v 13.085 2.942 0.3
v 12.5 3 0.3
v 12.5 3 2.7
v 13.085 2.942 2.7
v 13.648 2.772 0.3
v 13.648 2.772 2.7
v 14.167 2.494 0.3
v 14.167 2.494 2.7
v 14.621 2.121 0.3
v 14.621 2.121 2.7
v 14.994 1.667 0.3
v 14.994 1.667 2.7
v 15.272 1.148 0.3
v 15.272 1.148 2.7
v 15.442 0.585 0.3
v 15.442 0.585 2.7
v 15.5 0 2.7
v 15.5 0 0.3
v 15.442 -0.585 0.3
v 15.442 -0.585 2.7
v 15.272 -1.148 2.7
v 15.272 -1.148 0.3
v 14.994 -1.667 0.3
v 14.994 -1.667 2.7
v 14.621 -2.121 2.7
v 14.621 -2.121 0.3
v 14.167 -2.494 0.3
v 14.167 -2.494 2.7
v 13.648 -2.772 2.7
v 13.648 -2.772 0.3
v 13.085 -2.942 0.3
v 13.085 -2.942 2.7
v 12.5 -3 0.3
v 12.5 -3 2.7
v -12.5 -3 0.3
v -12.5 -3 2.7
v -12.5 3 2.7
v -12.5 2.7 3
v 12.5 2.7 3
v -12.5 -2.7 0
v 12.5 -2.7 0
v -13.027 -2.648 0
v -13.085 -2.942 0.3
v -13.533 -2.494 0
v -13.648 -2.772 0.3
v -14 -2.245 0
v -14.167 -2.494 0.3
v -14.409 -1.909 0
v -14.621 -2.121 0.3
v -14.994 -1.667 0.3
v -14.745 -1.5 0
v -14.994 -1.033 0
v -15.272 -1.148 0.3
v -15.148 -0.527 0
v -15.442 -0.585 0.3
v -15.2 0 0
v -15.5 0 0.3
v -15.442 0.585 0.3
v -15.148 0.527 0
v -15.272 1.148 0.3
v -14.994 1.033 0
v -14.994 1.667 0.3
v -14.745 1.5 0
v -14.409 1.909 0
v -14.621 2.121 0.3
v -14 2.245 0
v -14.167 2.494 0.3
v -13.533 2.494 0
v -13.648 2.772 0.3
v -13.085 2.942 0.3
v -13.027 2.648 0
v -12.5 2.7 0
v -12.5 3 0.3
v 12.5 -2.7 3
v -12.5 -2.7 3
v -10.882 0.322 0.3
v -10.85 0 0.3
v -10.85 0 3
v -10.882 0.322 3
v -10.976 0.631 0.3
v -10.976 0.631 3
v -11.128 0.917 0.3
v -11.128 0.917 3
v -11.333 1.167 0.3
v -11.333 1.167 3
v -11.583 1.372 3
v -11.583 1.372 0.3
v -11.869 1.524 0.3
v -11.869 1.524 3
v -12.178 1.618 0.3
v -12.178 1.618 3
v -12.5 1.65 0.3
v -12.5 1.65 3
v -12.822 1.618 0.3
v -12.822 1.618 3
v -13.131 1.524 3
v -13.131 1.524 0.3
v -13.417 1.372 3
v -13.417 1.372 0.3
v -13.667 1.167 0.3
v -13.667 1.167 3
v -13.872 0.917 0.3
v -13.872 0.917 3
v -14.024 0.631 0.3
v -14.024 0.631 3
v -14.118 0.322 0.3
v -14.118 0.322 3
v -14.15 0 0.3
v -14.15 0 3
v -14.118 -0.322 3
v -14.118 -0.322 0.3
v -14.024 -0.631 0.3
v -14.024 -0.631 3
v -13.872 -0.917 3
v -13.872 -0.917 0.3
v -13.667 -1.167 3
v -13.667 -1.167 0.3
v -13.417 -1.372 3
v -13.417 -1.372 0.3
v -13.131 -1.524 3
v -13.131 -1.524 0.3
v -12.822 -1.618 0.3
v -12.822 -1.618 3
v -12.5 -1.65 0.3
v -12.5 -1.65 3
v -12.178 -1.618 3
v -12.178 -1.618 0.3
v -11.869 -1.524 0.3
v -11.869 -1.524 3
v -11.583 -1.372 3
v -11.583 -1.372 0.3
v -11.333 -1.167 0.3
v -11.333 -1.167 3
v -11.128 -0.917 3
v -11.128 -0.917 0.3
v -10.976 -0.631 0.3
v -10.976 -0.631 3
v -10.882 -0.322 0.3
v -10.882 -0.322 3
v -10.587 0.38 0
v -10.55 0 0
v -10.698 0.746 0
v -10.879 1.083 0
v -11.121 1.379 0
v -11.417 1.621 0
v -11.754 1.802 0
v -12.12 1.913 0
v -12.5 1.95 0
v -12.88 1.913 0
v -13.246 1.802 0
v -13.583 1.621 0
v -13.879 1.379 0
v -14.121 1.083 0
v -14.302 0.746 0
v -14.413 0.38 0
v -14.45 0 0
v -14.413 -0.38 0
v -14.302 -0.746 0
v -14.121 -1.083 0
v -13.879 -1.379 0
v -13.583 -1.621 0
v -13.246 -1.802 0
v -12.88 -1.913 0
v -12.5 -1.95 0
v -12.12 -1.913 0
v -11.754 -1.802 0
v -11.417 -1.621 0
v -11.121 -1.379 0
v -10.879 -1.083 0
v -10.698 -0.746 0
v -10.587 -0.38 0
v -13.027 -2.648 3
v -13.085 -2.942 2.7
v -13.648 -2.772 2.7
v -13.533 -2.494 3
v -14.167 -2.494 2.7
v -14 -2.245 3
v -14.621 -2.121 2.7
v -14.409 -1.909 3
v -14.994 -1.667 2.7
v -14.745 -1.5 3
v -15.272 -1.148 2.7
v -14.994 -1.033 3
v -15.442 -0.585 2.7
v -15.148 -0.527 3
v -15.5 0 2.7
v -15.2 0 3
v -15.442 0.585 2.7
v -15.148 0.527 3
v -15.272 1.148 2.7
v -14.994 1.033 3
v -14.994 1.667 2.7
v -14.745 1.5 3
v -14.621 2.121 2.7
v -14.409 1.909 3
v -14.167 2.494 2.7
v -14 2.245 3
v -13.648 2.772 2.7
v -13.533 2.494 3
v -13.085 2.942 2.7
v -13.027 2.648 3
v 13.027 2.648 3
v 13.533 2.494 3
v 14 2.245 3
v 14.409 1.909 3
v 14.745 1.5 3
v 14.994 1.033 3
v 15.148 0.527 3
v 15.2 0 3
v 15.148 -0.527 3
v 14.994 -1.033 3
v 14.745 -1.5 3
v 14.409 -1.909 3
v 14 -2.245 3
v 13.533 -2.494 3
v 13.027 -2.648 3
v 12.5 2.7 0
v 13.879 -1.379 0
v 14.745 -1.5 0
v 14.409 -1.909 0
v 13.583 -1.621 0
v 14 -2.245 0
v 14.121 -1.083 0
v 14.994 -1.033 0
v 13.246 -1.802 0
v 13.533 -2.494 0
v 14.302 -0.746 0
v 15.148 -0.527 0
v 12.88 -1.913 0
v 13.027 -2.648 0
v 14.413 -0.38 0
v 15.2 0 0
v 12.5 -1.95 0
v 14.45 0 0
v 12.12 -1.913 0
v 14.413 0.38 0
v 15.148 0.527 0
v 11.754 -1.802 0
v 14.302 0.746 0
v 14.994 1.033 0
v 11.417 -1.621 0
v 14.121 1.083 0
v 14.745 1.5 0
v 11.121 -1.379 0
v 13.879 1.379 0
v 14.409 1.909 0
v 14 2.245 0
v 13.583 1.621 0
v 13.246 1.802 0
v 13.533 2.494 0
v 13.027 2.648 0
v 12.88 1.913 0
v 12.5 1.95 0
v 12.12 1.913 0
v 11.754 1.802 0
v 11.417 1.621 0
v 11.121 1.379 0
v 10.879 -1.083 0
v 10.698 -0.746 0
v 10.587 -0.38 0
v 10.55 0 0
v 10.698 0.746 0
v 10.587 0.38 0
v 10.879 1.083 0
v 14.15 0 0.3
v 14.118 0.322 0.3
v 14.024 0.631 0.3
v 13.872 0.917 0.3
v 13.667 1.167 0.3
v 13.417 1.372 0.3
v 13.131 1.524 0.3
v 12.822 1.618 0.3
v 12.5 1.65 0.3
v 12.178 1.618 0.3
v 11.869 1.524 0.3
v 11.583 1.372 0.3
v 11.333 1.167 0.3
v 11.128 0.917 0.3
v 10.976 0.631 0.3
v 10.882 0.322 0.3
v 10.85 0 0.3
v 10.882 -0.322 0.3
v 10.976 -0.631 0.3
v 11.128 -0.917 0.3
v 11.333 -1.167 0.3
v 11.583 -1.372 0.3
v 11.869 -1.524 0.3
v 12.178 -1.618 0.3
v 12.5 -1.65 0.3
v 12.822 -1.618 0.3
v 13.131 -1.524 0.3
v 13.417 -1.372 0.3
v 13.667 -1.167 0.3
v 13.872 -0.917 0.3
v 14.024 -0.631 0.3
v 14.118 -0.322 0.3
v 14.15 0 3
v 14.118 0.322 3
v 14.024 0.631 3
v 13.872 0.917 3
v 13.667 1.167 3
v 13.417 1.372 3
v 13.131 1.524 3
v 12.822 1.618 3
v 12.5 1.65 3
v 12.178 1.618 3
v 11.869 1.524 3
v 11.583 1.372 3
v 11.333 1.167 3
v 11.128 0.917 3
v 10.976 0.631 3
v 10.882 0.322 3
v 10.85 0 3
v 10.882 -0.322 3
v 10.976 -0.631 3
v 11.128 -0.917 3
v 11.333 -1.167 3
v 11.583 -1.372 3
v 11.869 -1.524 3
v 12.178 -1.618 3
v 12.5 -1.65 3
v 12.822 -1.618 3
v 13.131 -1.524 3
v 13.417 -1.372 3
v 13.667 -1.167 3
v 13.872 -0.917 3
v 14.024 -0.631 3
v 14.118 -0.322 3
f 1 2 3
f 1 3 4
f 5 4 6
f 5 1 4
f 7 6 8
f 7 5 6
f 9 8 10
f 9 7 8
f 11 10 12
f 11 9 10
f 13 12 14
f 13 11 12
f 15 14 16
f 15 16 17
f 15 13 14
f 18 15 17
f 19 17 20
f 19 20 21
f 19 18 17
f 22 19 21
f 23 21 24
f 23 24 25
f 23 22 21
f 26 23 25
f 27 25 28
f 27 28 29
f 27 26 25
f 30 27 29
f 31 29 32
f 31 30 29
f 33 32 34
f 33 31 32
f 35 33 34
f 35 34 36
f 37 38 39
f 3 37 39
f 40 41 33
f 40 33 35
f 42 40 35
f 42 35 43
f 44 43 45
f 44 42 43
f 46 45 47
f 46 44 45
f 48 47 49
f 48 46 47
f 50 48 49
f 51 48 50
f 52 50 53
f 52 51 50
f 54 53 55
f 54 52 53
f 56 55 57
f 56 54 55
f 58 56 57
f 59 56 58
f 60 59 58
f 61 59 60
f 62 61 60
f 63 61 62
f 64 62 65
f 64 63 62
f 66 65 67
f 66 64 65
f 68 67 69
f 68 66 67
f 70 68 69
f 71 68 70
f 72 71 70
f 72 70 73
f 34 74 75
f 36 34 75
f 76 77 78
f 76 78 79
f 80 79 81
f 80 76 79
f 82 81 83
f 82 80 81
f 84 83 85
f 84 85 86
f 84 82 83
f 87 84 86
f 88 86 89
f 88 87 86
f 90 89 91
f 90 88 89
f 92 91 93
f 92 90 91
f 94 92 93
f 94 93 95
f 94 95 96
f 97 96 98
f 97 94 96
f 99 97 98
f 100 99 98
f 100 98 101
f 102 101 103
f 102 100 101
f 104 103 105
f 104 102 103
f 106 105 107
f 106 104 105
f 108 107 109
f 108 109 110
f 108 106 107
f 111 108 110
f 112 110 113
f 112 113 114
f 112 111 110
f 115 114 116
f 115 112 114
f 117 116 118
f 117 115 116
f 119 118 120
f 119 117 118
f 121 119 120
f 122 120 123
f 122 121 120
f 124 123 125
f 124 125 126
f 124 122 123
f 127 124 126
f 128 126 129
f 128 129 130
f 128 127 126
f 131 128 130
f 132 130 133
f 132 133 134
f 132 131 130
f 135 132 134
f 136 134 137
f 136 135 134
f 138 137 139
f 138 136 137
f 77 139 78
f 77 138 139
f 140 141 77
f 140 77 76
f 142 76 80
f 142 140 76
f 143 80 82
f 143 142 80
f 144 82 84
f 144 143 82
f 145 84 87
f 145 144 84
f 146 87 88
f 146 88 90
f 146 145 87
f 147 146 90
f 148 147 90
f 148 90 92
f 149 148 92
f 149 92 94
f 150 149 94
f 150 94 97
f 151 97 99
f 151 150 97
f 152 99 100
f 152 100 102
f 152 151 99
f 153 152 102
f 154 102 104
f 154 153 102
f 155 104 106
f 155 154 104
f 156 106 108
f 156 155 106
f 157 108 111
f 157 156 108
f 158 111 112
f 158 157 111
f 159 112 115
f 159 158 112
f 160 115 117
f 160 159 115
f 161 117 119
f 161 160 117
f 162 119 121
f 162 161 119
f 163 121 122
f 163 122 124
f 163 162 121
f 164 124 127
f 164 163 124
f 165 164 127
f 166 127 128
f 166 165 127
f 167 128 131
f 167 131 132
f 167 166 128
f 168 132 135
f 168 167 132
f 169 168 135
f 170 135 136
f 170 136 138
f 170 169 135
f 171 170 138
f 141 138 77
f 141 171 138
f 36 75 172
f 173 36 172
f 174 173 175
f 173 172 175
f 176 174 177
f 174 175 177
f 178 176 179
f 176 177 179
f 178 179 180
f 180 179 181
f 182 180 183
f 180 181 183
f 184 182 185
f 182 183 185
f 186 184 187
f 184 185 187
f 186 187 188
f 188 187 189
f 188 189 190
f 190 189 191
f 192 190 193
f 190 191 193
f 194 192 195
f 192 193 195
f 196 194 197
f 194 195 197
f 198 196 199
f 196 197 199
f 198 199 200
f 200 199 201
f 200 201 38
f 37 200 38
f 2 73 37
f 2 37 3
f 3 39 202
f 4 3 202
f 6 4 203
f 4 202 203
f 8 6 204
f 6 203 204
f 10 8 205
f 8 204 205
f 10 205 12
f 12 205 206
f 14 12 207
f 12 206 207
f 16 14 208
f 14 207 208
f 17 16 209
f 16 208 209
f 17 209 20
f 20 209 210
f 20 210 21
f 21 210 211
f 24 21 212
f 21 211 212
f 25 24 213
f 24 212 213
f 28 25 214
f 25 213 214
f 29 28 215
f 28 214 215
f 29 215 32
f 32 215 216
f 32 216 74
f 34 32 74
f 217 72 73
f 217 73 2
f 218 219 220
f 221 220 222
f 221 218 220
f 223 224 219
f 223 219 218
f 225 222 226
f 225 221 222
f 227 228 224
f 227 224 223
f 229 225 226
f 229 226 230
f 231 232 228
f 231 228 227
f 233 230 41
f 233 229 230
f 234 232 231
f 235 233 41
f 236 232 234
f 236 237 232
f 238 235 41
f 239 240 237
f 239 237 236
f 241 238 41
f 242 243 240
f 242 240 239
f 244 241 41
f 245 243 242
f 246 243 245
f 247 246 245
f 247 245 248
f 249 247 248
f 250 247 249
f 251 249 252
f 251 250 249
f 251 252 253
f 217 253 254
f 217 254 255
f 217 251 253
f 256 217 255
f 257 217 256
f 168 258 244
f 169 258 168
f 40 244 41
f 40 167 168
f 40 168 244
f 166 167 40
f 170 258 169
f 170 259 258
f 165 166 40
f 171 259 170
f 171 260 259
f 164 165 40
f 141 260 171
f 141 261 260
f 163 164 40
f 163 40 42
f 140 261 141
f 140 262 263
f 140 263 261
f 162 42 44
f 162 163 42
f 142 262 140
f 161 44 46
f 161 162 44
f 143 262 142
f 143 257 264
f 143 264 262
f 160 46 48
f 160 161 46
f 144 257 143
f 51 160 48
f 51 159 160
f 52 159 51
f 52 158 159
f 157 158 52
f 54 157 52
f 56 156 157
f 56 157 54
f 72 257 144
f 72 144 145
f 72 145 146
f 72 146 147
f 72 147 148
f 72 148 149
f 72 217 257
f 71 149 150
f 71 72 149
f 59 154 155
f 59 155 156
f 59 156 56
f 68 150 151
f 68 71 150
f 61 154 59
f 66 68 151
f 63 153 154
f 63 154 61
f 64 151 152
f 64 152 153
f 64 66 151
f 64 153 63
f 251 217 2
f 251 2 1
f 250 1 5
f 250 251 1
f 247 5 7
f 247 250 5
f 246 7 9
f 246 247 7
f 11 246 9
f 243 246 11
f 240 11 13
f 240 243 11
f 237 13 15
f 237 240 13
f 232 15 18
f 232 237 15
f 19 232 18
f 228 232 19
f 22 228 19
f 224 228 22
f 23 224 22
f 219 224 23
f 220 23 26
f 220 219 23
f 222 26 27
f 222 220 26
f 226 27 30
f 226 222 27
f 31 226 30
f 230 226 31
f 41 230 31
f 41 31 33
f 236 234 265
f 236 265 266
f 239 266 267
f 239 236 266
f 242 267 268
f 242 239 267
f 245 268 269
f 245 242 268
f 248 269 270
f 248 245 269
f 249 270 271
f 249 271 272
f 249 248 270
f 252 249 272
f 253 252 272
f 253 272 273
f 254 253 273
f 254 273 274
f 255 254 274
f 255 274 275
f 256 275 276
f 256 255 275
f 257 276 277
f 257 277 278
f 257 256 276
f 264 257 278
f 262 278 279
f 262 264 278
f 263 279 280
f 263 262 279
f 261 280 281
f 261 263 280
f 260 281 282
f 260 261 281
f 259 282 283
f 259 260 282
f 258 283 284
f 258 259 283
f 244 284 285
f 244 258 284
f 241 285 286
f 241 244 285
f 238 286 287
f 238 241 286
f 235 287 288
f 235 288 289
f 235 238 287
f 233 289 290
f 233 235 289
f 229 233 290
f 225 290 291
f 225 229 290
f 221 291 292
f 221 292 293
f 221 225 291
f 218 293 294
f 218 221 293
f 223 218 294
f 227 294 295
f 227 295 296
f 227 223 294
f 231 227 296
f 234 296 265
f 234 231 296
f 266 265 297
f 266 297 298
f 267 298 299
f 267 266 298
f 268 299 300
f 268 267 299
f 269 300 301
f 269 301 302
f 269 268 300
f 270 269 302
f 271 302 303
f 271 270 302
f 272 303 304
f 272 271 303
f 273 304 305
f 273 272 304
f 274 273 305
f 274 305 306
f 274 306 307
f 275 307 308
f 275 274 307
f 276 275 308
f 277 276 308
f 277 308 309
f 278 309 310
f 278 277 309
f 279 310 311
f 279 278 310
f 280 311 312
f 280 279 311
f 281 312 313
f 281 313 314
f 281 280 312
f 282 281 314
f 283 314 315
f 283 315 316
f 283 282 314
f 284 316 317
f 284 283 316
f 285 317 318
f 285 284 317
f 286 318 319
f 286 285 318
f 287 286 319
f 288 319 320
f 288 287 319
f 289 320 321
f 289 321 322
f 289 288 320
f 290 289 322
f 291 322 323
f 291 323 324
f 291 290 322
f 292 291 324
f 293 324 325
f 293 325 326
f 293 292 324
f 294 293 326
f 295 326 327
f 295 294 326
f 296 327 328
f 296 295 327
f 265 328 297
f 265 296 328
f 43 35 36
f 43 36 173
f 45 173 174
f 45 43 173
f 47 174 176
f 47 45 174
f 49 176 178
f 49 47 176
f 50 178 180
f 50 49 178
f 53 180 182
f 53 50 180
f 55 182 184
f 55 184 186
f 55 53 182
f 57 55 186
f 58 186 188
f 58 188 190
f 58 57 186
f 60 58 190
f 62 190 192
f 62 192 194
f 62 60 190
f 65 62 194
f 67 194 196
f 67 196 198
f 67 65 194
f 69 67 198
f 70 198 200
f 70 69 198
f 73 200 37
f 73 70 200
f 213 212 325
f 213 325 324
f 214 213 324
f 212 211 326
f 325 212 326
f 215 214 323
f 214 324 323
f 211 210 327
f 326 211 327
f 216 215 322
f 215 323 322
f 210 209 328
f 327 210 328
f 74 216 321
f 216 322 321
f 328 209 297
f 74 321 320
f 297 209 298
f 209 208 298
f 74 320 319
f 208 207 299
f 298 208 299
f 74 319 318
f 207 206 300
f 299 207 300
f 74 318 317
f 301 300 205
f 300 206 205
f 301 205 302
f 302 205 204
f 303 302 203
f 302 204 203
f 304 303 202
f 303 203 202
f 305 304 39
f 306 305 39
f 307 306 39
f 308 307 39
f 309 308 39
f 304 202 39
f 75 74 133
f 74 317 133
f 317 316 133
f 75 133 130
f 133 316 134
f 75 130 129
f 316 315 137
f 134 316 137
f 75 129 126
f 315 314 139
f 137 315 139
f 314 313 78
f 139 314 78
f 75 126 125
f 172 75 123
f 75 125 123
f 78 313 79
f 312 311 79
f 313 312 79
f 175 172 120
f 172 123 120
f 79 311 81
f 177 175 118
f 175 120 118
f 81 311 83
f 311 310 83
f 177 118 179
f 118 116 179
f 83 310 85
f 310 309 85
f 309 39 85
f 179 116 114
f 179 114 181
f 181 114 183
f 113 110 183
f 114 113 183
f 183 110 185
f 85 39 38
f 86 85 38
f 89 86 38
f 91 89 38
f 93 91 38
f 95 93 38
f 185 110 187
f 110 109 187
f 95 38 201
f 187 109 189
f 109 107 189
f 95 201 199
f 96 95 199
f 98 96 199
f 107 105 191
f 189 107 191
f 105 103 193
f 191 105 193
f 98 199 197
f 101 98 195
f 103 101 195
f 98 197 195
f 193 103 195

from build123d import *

# Parameters (mm, degrees)
SKETCH_1_R      = 1.65
EXTRUDE_1_DEPTH = 3
CHAMFER_1_SIZE  = 0.3


with BuildPart() as part:
    # 草图1 → 凸台-拉伸1 (new body)
    with BuildSketch(Plane.XY):
        with BuildLine():
            Line((-12.5, 3), (12.5, 3))
            ThreePointArc((12.5, 3), (15.5, 0), (12.5, -3))
            Line((12.5, -3), (-12.5, -3))
            ThreePointArc((-12.5, -3), (-15.5, 0), (-12.5, 3))
        make_face()
        with Locations((-12.5, 0)):
            Circle(SKETCH_1_R, mode=Mode.SUBTRACT)
        with Locations((12.5, 0)):
            Circle(SKETCH_1_R, mode=Mode.SUBTRACT)
    extrude(amount=EXTRUDE_1_DEPTH)

    # 倒角1
    chamfer_1_edges = [part.edges().sort_by_distance(p)[0] for p in [
        (-14.15, 0, 0),
        (15.5, 0, 3),
        (10.85, 0, 0),
        (0, 3, 3),
        (-15.5, 0, 3),
        (0, 3, 0),
        (15.5, 0, 0),
        (0, -3, 0),
        (-15.5, 0, 0),
        (0, -3, 3),
    ]]
    chamfer(chamfer_1_edges, length=CHAMFER_1_SIZE)


solid = part.part
